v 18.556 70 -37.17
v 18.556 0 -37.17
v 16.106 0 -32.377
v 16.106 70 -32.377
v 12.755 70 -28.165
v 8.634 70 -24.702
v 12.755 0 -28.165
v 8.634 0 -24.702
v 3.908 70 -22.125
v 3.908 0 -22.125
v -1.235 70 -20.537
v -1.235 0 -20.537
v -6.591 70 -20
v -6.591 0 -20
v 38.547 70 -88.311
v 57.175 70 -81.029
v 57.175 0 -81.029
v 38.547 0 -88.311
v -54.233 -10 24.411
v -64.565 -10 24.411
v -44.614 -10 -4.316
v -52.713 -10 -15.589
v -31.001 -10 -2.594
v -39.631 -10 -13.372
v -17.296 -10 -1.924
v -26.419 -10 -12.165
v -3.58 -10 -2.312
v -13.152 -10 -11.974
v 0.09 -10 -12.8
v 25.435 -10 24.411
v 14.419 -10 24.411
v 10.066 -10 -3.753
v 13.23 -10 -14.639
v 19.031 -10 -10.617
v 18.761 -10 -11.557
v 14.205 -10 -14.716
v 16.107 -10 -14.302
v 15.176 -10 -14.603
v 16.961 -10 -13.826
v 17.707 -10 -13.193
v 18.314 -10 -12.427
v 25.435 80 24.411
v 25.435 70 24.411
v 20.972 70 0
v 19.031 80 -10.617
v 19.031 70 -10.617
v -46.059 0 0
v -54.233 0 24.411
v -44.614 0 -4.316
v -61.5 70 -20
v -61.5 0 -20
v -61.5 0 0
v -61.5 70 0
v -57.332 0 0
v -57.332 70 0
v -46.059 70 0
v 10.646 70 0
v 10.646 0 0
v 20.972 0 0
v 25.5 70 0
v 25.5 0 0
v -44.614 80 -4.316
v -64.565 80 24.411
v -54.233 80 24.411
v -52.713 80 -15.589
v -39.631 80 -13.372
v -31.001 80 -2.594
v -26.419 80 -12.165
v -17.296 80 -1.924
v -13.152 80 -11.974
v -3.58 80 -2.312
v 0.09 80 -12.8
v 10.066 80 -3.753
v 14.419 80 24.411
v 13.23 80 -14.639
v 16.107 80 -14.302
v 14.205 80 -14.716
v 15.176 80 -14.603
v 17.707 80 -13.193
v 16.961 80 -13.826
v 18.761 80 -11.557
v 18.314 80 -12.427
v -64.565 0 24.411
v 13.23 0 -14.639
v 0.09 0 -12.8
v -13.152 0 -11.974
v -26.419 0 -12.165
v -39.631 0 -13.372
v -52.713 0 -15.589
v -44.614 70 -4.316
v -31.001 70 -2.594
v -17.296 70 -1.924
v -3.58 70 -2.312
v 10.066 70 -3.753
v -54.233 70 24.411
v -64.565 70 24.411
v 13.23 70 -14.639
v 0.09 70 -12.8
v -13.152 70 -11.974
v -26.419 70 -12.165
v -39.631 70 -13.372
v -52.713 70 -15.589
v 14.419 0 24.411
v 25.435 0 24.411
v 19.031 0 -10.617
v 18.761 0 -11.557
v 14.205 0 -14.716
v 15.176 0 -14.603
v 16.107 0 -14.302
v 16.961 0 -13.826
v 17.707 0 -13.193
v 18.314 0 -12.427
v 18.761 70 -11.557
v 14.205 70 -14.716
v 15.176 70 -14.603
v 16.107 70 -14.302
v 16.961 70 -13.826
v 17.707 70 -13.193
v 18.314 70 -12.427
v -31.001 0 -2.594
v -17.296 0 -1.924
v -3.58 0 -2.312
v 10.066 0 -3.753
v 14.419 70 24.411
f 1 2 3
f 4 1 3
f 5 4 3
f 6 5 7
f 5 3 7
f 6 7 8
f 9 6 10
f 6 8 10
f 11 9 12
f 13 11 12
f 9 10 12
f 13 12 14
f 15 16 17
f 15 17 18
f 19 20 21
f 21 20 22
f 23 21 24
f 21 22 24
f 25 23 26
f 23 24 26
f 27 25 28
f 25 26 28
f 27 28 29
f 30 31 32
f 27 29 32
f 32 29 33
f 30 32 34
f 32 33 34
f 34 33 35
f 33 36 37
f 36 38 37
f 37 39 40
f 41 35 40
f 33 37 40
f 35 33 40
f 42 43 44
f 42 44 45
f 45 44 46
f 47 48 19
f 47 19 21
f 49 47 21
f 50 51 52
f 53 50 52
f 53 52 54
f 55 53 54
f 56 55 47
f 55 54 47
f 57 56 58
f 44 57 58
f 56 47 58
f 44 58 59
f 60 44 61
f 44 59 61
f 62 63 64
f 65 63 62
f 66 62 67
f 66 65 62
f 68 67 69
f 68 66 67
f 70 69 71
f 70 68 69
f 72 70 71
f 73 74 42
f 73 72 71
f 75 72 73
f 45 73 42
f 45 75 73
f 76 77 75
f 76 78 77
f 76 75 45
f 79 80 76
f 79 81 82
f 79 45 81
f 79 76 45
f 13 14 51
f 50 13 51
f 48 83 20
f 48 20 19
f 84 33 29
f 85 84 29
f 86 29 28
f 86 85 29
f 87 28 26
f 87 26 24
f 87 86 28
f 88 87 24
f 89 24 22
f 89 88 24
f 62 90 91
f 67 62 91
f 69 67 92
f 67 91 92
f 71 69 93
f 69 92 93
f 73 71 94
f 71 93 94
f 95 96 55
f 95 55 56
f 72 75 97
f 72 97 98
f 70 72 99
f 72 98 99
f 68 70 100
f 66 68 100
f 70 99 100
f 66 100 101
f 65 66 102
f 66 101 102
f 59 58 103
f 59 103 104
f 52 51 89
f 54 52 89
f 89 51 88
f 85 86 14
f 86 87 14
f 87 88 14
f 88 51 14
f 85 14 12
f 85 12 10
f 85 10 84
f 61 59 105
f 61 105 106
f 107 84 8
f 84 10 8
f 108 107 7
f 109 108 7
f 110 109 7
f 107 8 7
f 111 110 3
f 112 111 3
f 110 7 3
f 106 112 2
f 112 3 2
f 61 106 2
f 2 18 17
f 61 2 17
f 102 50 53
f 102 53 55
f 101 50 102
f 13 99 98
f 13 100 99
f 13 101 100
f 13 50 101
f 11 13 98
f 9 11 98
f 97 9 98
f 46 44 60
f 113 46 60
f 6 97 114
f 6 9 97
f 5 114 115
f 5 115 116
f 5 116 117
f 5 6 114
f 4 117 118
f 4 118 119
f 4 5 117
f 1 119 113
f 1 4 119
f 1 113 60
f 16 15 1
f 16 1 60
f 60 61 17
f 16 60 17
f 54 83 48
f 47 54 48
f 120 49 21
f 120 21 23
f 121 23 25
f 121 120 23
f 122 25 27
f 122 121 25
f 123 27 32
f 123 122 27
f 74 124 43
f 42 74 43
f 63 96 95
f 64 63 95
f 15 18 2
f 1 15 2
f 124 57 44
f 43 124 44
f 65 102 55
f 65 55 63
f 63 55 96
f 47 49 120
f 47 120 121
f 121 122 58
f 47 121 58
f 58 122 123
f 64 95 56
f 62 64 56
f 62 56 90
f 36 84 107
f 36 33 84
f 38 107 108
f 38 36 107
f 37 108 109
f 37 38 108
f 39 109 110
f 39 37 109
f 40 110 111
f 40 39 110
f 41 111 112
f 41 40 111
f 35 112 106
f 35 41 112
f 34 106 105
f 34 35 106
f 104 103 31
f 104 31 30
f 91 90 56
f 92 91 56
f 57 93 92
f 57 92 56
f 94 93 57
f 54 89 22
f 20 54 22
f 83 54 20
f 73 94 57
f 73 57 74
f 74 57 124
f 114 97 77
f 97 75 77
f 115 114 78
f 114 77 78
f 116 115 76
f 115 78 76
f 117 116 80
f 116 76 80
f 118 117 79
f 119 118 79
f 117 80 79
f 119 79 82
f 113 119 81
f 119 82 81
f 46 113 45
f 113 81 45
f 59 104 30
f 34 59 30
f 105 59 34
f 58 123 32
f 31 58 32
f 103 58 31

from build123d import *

# Parameters (mm, degrees)
BOSS_EXTRUDE1_DEPTH  = 70
BOSS_EXTRUDE2_DEPTH  = 10
FILLET1_R            = 5
FILLET1_OF_MIRROR1_R = 5


with BuildPart() as part:
    # Sketch1 → Boss-Extrude1 (new body)
    with BuildSketch(Plane(origin=(0, 0, 0), x_dir=(1, 0, 0), z_dir=(0, 1, 0))):
        with BuildLine():
            Line((-61.500129939, 0), (25.499870061, 0))
            Line((25.499870061, 0), (57.174837058, 81.028985343))
            Line((57.174837058, 81.028985343), (38.547484106, 88.310586952))
            Line((38.547484106, 88.310586952), (18.556100358, 37.169837828))
            ThreePointArc((18.556100358, 37.169837828), (8.633917242, 24.701856819), (-6.590826128, 20))
            Line((-6.590826128, 20), (-61.500129939, 20))
            Line((-61.500129939, 20), (-61.500129939, 0))
        make_face()
    extrude(amount=BOSS_EXTRUDE1_DEPTH)

    # Sketch2 → Boss-Extrude2 (add)
    with BuildSketch(Plane(origin=(0, 70, 0), x_dir=(1, 0, 0), z_dir=(0, 1, 0))):
        with BuildLine():
            Line((-52.712841503, 15.588653402), (-64.56499654, -24.411346598))
            Line((-64.56499654, -24.411346598), (-54.23346703, -24.411346598))
            Line((-54.23346703, -24.411346598), (-44.613683261, 4.315907023))
            ThreePointArc((-44.613683261, 4.315907023), (-17.295669473, 1.924485185), (10.065785793, 3.753020511))
            Line((10.065785793, 3.753020511), (14.418892199, -24.411346598))
            Line((14.418892199, -24.411346598), (25.43500346, -24.411346598))
            Line((25.43500346, -24.411346598), (18.121502556, 15.588653402))
            ThreePointArc((18.121502556, 15.588653402), (-17.295669473, 11.924485184), (-52.712841503, 15.588653402))
        make_face()
    boss_extrude2 = extrude(amount=BOSS_EXTRUDE2_DEPTH)

    # Fillet1
    fillet1_edges = [part.edges().sort_by_distance(p)[0] for p in [
        (18.121502556, 75, -15.588653402),
    ]]
    fillet(fillet1_edges, radius=FILLET1_R)

    # Mirror1: Boss-Extrude2 across plane
    add(boss_extrude2.mirror(Plane.ZX.offset(35)))

    # Fillet1 of Mirror1
    fillet1_of_mirror1_edges = [part.edges().sort_by_distance(p)[0] for p in [
        (18.121502556, -5, -15.588653402),
    ]]
    fillet(fillet1_of_mirror1_edges, radius=FILLET1_OF_MIRROR1_R)


solid = part.part
